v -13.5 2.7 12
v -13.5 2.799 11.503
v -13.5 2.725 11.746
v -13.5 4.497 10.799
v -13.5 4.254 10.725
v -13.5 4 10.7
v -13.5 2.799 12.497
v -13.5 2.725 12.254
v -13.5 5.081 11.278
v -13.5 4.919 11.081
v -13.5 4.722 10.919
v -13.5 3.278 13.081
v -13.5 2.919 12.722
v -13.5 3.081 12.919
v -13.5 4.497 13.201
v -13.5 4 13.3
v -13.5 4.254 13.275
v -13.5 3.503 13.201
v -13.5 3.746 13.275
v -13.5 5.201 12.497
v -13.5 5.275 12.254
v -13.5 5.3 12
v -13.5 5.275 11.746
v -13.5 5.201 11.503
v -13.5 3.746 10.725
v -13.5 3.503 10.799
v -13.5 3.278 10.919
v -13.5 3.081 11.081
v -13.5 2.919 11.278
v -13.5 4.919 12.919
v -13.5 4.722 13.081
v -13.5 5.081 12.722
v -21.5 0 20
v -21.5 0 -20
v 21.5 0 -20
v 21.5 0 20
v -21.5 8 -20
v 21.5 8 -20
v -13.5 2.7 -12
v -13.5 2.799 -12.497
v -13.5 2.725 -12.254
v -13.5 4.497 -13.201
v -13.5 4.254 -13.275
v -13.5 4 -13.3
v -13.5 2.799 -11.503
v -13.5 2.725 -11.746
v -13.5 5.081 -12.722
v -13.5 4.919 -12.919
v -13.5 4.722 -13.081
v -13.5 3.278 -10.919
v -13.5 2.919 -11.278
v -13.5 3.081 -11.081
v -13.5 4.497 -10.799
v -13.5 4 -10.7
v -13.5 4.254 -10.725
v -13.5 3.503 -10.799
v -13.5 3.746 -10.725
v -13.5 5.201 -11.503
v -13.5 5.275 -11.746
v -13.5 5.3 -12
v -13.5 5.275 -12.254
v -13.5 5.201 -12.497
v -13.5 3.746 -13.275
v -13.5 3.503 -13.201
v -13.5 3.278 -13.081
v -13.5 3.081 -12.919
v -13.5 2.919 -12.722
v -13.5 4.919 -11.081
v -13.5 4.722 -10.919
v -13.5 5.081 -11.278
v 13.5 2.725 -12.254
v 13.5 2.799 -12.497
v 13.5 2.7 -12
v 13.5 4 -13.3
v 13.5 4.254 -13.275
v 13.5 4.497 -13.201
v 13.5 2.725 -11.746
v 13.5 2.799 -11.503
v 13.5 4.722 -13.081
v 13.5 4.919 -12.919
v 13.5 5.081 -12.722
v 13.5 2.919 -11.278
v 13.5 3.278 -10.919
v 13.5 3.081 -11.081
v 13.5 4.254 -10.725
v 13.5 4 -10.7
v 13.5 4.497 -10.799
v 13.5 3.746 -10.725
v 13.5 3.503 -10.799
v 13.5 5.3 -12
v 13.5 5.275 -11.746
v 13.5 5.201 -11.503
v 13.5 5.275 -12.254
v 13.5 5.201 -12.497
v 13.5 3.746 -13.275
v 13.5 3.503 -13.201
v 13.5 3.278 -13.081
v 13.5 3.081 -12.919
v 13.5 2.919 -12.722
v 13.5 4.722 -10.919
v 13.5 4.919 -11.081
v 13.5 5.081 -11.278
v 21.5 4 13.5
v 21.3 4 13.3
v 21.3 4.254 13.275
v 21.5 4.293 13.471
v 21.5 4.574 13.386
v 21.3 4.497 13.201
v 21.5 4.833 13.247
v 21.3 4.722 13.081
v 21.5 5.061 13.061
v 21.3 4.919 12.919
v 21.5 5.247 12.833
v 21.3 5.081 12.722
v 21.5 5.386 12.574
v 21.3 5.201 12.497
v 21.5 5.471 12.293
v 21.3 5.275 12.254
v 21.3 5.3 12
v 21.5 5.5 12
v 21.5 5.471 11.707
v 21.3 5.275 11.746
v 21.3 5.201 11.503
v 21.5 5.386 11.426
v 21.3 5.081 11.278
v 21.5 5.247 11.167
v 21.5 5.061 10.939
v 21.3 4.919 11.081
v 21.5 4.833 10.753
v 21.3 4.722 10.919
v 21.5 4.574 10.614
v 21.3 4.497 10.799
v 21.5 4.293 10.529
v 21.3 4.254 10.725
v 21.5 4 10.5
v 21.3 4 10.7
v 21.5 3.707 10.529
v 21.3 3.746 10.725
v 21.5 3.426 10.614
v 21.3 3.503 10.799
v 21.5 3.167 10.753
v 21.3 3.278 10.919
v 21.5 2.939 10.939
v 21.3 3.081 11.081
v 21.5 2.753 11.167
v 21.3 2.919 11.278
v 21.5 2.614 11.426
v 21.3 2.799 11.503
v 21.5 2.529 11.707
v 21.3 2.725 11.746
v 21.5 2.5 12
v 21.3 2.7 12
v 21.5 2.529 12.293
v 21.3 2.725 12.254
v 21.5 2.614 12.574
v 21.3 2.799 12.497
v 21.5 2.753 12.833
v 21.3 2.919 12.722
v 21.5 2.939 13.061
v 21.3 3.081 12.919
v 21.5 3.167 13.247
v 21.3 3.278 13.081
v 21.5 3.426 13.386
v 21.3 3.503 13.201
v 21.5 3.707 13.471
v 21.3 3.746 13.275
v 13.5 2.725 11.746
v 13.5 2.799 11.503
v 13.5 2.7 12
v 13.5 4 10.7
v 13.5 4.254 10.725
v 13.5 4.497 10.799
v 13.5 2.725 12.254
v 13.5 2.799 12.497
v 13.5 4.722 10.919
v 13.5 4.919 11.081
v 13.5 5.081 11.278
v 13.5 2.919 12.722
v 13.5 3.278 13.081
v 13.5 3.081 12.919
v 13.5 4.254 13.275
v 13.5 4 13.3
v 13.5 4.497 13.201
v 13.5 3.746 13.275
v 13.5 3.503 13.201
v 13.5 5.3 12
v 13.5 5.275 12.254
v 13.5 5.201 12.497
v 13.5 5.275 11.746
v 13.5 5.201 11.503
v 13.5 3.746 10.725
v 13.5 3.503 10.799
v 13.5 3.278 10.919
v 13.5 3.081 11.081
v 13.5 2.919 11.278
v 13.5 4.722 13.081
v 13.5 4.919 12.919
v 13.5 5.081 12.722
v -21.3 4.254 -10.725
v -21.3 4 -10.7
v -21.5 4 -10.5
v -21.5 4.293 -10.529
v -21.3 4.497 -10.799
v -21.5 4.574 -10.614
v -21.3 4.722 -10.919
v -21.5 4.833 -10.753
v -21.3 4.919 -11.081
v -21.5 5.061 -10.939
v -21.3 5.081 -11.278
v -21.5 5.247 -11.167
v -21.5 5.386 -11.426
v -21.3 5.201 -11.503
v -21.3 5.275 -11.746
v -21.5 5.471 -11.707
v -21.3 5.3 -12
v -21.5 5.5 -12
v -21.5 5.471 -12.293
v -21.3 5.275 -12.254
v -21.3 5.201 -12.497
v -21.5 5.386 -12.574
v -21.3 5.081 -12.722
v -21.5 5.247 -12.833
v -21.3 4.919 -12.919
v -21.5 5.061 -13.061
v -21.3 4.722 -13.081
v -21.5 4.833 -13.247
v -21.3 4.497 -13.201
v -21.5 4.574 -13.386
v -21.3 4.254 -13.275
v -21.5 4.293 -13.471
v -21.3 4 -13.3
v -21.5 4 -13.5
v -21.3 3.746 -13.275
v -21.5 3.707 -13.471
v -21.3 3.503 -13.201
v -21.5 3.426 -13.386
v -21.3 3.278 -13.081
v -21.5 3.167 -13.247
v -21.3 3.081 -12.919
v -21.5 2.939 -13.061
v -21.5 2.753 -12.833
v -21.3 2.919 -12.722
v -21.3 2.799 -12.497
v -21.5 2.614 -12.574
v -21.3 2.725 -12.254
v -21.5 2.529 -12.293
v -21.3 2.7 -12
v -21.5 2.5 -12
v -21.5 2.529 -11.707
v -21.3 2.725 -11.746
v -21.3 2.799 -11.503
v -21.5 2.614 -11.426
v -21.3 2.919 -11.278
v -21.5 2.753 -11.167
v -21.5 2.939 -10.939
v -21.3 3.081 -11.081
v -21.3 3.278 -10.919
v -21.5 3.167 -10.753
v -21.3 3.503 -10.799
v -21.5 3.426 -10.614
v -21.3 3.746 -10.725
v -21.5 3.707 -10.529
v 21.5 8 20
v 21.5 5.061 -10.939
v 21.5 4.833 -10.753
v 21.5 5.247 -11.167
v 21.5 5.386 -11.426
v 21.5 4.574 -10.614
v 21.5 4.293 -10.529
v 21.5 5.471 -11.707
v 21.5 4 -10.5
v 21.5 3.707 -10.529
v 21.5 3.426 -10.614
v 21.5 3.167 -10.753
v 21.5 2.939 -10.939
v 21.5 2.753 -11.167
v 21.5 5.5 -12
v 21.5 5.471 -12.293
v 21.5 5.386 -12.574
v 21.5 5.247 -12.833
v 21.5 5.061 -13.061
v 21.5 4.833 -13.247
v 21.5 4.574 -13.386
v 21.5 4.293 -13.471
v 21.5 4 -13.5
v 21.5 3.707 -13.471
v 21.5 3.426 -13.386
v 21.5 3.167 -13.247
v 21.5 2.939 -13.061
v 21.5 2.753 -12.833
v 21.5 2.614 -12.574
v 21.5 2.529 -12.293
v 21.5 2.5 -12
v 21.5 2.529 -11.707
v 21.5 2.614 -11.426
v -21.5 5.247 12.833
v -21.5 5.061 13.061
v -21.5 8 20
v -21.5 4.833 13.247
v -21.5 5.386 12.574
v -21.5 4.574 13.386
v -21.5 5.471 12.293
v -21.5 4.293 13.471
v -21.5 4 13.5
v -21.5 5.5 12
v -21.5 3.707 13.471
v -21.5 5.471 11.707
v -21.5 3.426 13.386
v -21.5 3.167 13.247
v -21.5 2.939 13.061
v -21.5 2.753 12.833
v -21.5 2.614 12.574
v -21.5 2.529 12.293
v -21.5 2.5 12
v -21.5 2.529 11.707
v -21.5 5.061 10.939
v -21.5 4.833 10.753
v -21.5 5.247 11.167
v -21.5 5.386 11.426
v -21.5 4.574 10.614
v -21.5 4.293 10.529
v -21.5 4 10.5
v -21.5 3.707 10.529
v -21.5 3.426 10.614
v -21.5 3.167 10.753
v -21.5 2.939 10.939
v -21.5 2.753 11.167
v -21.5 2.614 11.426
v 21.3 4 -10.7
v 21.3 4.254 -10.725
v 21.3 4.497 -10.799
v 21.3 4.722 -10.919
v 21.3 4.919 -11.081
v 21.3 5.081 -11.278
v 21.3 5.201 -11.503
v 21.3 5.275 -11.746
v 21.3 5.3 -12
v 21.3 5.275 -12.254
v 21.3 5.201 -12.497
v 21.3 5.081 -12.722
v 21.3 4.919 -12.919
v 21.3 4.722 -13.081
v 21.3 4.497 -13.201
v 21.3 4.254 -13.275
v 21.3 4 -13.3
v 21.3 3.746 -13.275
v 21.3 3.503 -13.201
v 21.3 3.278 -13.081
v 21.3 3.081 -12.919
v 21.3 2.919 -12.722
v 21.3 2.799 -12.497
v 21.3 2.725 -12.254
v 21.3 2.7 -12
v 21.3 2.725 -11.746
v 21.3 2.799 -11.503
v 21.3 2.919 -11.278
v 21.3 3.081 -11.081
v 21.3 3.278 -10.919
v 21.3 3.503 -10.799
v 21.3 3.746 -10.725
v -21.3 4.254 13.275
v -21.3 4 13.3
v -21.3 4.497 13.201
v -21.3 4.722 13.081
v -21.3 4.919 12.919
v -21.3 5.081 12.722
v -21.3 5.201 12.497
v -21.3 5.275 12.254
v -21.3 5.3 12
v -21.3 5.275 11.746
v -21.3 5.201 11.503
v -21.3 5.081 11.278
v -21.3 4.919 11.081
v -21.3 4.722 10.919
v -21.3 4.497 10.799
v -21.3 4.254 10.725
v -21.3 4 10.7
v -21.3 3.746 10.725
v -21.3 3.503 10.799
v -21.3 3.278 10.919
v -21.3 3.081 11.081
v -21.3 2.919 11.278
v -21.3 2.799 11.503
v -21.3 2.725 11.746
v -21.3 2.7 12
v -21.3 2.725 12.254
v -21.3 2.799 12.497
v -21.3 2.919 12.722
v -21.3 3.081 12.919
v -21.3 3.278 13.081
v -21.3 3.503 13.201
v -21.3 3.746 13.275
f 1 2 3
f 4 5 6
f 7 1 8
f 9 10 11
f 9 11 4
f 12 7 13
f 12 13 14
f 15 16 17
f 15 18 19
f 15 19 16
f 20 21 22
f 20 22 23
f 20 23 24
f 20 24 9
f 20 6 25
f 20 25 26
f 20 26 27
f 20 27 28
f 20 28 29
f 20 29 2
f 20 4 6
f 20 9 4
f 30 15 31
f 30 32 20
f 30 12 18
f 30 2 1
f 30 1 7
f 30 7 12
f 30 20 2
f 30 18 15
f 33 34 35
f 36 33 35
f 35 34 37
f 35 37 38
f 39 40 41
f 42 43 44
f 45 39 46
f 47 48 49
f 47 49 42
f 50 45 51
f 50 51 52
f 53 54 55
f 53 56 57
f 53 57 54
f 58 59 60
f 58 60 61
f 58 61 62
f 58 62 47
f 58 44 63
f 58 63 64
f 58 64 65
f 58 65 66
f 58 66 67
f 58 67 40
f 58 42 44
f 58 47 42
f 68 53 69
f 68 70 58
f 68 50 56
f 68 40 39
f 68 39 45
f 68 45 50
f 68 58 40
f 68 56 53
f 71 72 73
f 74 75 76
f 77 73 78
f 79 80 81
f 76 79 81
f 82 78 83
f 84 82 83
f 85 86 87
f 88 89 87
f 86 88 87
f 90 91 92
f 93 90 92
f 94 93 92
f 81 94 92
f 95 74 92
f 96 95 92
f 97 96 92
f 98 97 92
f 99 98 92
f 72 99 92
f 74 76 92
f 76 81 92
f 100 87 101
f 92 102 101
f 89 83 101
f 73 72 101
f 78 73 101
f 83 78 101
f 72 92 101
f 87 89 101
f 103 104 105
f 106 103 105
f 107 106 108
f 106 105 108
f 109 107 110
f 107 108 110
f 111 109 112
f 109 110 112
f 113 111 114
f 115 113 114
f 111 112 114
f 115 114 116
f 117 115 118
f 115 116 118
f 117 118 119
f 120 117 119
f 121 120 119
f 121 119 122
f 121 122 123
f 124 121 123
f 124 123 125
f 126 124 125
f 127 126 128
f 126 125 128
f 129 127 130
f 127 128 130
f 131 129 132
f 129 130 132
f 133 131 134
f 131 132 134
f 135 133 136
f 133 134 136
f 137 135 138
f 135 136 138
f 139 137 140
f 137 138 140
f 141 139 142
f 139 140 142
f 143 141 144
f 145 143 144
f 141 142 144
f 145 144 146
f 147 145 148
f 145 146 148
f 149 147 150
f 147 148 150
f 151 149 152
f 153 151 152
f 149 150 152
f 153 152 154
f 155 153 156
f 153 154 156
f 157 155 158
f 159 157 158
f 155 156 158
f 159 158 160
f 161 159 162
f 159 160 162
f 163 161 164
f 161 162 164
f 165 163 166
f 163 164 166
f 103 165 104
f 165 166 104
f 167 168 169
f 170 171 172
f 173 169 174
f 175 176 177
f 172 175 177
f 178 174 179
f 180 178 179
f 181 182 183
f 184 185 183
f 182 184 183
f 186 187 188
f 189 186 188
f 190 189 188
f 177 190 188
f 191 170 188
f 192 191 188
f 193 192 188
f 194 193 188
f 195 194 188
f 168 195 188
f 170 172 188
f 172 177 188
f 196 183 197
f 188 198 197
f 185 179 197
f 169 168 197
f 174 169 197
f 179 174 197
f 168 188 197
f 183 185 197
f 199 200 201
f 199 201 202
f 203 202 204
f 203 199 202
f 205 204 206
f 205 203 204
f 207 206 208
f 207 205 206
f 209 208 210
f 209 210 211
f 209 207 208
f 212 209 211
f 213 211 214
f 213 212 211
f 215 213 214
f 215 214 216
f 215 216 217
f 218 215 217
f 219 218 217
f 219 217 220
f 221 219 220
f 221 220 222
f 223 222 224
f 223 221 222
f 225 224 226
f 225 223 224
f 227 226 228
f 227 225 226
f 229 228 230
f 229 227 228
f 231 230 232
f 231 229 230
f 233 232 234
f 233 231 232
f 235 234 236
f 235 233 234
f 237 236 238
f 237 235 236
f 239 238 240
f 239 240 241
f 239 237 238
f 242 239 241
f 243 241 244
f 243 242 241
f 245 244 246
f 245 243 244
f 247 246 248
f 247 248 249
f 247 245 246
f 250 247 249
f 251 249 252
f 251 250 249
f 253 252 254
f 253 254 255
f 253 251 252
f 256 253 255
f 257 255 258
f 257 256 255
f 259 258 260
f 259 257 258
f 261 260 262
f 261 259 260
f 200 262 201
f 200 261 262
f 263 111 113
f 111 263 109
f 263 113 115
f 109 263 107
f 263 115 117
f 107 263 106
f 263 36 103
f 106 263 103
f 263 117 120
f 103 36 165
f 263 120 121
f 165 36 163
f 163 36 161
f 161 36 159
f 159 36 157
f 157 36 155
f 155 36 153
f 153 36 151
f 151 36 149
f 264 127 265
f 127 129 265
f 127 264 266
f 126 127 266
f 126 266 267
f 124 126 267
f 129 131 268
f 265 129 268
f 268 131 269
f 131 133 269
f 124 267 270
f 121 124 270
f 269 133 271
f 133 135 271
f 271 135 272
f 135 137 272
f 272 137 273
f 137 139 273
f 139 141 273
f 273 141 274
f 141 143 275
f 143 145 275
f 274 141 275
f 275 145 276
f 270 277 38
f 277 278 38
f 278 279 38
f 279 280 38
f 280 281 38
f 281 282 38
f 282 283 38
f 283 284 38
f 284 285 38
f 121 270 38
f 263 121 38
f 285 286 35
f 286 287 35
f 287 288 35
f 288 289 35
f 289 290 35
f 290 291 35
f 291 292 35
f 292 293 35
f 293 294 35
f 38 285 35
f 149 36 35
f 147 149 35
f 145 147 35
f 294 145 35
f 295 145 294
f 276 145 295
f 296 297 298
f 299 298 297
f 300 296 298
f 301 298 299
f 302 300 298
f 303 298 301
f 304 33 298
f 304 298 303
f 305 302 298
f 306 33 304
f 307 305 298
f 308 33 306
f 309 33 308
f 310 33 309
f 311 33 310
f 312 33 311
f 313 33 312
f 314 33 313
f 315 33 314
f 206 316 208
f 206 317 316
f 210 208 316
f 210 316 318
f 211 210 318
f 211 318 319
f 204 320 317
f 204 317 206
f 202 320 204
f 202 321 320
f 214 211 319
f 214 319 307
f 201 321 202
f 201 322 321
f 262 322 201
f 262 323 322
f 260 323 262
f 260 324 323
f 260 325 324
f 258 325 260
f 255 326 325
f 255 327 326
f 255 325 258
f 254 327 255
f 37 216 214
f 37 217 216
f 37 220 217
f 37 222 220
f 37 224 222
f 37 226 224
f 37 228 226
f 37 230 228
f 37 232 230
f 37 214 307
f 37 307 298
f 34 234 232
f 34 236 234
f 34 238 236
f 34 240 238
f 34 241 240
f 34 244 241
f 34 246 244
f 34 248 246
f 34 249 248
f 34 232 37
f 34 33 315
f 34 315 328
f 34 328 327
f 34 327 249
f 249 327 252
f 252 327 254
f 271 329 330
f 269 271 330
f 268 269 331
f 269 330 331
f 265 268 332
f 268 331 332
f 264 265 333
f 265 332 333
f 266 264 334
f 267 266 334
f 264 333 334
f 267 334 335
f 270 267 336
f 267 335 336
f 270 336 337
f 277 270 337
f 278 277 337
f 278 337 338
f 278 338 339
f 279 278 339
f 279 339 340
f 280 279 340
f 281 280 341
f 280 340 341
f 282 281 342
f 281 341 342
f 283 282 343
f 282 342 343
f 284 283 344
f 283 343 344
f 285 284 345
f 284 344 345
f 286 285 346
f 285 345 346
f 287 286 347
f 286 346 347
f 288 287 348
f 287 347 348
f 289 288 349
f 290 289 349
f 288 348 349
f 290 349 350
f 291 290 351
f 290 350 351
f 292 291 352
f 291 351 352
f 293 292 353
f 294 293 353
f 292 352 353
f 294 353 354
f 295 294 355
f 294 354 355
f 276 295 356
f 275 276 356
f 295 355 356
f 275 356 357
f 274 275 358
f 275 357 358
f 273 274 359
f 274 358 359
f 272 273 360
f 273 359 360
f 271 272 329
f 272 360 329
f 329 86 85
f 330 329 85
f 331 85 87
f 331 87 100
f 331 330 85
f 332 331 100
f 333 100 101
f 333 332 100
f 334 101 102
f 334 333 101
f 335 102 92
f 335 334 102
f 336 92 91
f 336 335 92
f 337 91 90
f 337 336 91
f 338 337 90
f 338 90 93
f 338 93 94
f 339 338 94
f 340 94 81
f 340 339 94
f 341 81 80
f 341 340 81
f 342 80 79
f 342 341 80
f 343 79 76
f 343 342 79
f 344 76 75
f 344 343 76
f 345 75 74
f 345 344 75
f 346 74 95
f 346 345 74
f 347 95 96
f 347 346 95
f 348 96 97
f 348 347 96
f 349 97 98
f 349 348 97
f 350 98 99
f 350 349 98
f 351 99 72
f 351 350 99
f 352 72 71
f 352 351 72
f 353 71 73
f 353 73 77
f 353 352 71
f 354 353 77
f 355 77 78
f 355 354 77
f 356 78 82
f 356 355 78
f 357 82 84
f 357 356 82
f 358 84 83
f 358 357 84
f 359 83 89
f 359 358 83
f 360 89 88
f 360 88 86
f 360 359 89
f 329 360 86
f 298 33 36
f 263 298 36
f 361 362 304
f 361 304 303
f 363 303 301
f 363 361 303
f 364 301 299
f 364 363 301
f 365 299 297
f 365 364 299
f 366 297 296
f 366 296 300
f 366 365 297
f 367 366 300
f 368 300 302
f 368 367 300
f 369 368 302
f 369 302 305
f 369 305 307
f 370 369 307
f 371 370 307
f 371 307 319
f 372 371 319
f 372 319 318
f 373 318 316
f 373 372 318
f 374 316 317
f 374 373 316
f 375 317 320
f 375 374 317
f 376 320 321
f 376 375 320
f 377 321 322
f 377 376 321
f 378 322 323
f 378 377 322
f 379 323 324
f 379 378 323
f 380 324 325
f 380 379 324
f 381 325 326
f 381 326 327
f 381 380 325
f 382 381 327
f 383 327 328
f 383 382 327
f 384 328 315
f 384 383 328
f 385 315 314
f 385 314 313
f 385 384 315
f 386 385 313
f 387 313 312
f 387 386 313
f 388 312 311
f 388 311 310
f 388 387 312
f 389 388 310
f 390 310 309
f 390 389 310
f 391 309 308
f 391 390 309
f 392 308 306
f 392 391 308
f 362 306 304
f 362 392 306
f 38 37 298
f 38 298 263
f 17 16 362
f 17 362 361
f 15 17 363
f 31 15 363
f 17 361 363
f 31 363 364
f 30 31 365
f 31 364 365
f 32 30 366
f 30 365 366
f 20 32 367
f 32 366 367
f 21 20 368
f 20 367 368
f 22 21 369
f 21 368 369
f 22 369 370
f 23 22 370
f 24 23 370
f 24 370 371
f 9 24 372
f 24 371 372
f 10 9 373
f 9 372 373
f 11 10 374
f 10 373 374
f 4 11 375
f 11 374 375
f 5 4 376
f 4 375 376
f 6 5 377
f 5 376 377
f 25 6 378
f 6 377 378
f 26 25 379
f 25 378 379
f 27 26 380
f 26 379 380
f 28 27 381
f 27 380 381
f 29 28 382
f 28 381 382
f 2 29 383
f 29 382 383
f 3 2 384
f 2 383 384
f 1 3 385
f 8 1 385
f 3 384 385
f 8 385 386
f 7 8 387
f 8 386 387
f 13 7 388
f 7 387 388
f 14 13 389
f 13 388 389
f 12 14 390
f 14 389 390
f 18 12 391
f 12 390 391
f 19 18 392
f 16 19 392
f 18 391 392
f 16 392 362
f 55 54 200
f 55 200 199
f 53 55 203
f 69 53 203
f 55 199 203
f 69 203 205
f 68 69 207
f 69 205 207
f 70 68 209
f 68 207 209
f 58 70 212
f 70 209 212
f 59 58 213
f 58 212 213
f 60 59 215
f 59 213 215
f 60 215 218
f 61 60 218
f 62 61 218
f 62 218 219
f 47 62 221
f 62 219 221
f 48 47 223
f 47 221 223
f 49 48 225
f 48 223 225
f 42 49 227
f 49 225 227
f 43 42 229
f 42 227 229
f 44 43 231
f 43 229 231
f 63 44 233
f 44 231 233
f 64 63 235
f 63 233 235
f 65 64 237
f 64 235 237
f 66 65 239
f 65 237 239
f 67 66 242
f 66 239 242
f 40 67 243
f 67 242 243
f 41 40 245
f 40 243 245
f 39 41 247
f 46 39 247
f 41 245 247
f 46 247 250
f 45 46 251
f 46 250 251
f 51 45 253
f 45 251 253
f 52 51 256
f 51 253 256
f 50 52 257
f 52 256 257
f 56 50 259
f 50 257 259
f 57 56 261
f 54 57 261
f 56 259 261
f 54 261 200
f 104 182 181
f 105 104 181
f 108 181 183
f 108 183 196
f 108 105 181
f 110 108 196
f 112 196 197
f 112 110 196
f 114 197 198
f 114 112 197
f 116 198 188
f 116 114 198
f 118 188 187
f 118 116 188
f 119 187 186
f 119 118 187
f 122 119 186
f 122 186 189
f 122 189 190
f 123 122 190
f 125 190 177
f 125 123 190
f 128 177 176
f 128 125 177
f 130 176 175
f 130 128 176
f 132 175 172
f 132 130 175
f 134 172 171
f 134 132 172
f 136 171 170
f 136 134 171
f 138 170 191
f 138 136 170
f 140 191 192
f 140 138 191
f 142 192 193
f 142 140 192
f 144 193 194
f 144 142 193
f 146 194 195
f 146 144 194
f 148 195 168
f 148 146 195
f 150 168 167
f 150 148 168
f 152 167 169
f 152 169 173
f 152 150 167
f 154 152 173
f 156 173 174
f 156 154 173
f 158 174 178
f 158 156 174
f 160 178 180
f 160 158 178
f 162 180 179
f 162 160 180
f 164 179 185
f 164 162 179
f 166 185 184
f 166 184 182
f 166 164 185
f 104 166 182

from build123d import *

# Parameters (mm, degrees)
SKETCH_1_W          = 43
SKETCH_1_H          = 40
EXTRUDE_1_DEPTH     = 8
SKETCH_2_R          = 1.3
CUT_EXTRUDE_1_DEPTH = 8
CHAMFER_1_SIZE      = 0.2


with BuildPart() as part:
    # 草圖1 → 填料-伸長1 (new body)
    with BuildSketch(Plane(origin=(0, 0, 0), x_dir=(1, 0, 0), z_dir=(0, 1, 0))):
        Rectangle(SKETCH_1_W, SKETCH_1_H)
    extrude(amount=EXTRUDE_1_DEPTH)

    # 草圖2 → 除料-伸長1 (cut)
    with BuildSketch(Plane.ZY.offset(21.5)):
        with Locations((-12, 4)):
            Circle(SKETCH_2_R)
        with Locations((12, 4)):
            Circle(SKETCH_2_R)
    cut_extrude_1 = extrude(amount=-CUT_EXTRUDE_1_DEPTH, mode=Mode.SUBTRACT)

    # 鏡射1: 除料-伸長1 across plane
    add(cut_extrude_1.mirror(Plane(origin=(0, 0, 0), x_dir=(0, 0, 1), z_dir=(1, 0, 0))), mode=Mode.SUBTRACT)

    # 導角1
    chamfer_1_edges = [part.edges().sort_by_distance(p)[0] for p in [
        (-21.5, 4, -13.3),
        (-21.5, 4, 10.7),
        (21.5, 4, -13.3),
        (21.5, 4, 10.7),
    ]]
    chamfer(chamfer_1_edges, length=CHAMFER_1_SIZE)


solid = part.part
